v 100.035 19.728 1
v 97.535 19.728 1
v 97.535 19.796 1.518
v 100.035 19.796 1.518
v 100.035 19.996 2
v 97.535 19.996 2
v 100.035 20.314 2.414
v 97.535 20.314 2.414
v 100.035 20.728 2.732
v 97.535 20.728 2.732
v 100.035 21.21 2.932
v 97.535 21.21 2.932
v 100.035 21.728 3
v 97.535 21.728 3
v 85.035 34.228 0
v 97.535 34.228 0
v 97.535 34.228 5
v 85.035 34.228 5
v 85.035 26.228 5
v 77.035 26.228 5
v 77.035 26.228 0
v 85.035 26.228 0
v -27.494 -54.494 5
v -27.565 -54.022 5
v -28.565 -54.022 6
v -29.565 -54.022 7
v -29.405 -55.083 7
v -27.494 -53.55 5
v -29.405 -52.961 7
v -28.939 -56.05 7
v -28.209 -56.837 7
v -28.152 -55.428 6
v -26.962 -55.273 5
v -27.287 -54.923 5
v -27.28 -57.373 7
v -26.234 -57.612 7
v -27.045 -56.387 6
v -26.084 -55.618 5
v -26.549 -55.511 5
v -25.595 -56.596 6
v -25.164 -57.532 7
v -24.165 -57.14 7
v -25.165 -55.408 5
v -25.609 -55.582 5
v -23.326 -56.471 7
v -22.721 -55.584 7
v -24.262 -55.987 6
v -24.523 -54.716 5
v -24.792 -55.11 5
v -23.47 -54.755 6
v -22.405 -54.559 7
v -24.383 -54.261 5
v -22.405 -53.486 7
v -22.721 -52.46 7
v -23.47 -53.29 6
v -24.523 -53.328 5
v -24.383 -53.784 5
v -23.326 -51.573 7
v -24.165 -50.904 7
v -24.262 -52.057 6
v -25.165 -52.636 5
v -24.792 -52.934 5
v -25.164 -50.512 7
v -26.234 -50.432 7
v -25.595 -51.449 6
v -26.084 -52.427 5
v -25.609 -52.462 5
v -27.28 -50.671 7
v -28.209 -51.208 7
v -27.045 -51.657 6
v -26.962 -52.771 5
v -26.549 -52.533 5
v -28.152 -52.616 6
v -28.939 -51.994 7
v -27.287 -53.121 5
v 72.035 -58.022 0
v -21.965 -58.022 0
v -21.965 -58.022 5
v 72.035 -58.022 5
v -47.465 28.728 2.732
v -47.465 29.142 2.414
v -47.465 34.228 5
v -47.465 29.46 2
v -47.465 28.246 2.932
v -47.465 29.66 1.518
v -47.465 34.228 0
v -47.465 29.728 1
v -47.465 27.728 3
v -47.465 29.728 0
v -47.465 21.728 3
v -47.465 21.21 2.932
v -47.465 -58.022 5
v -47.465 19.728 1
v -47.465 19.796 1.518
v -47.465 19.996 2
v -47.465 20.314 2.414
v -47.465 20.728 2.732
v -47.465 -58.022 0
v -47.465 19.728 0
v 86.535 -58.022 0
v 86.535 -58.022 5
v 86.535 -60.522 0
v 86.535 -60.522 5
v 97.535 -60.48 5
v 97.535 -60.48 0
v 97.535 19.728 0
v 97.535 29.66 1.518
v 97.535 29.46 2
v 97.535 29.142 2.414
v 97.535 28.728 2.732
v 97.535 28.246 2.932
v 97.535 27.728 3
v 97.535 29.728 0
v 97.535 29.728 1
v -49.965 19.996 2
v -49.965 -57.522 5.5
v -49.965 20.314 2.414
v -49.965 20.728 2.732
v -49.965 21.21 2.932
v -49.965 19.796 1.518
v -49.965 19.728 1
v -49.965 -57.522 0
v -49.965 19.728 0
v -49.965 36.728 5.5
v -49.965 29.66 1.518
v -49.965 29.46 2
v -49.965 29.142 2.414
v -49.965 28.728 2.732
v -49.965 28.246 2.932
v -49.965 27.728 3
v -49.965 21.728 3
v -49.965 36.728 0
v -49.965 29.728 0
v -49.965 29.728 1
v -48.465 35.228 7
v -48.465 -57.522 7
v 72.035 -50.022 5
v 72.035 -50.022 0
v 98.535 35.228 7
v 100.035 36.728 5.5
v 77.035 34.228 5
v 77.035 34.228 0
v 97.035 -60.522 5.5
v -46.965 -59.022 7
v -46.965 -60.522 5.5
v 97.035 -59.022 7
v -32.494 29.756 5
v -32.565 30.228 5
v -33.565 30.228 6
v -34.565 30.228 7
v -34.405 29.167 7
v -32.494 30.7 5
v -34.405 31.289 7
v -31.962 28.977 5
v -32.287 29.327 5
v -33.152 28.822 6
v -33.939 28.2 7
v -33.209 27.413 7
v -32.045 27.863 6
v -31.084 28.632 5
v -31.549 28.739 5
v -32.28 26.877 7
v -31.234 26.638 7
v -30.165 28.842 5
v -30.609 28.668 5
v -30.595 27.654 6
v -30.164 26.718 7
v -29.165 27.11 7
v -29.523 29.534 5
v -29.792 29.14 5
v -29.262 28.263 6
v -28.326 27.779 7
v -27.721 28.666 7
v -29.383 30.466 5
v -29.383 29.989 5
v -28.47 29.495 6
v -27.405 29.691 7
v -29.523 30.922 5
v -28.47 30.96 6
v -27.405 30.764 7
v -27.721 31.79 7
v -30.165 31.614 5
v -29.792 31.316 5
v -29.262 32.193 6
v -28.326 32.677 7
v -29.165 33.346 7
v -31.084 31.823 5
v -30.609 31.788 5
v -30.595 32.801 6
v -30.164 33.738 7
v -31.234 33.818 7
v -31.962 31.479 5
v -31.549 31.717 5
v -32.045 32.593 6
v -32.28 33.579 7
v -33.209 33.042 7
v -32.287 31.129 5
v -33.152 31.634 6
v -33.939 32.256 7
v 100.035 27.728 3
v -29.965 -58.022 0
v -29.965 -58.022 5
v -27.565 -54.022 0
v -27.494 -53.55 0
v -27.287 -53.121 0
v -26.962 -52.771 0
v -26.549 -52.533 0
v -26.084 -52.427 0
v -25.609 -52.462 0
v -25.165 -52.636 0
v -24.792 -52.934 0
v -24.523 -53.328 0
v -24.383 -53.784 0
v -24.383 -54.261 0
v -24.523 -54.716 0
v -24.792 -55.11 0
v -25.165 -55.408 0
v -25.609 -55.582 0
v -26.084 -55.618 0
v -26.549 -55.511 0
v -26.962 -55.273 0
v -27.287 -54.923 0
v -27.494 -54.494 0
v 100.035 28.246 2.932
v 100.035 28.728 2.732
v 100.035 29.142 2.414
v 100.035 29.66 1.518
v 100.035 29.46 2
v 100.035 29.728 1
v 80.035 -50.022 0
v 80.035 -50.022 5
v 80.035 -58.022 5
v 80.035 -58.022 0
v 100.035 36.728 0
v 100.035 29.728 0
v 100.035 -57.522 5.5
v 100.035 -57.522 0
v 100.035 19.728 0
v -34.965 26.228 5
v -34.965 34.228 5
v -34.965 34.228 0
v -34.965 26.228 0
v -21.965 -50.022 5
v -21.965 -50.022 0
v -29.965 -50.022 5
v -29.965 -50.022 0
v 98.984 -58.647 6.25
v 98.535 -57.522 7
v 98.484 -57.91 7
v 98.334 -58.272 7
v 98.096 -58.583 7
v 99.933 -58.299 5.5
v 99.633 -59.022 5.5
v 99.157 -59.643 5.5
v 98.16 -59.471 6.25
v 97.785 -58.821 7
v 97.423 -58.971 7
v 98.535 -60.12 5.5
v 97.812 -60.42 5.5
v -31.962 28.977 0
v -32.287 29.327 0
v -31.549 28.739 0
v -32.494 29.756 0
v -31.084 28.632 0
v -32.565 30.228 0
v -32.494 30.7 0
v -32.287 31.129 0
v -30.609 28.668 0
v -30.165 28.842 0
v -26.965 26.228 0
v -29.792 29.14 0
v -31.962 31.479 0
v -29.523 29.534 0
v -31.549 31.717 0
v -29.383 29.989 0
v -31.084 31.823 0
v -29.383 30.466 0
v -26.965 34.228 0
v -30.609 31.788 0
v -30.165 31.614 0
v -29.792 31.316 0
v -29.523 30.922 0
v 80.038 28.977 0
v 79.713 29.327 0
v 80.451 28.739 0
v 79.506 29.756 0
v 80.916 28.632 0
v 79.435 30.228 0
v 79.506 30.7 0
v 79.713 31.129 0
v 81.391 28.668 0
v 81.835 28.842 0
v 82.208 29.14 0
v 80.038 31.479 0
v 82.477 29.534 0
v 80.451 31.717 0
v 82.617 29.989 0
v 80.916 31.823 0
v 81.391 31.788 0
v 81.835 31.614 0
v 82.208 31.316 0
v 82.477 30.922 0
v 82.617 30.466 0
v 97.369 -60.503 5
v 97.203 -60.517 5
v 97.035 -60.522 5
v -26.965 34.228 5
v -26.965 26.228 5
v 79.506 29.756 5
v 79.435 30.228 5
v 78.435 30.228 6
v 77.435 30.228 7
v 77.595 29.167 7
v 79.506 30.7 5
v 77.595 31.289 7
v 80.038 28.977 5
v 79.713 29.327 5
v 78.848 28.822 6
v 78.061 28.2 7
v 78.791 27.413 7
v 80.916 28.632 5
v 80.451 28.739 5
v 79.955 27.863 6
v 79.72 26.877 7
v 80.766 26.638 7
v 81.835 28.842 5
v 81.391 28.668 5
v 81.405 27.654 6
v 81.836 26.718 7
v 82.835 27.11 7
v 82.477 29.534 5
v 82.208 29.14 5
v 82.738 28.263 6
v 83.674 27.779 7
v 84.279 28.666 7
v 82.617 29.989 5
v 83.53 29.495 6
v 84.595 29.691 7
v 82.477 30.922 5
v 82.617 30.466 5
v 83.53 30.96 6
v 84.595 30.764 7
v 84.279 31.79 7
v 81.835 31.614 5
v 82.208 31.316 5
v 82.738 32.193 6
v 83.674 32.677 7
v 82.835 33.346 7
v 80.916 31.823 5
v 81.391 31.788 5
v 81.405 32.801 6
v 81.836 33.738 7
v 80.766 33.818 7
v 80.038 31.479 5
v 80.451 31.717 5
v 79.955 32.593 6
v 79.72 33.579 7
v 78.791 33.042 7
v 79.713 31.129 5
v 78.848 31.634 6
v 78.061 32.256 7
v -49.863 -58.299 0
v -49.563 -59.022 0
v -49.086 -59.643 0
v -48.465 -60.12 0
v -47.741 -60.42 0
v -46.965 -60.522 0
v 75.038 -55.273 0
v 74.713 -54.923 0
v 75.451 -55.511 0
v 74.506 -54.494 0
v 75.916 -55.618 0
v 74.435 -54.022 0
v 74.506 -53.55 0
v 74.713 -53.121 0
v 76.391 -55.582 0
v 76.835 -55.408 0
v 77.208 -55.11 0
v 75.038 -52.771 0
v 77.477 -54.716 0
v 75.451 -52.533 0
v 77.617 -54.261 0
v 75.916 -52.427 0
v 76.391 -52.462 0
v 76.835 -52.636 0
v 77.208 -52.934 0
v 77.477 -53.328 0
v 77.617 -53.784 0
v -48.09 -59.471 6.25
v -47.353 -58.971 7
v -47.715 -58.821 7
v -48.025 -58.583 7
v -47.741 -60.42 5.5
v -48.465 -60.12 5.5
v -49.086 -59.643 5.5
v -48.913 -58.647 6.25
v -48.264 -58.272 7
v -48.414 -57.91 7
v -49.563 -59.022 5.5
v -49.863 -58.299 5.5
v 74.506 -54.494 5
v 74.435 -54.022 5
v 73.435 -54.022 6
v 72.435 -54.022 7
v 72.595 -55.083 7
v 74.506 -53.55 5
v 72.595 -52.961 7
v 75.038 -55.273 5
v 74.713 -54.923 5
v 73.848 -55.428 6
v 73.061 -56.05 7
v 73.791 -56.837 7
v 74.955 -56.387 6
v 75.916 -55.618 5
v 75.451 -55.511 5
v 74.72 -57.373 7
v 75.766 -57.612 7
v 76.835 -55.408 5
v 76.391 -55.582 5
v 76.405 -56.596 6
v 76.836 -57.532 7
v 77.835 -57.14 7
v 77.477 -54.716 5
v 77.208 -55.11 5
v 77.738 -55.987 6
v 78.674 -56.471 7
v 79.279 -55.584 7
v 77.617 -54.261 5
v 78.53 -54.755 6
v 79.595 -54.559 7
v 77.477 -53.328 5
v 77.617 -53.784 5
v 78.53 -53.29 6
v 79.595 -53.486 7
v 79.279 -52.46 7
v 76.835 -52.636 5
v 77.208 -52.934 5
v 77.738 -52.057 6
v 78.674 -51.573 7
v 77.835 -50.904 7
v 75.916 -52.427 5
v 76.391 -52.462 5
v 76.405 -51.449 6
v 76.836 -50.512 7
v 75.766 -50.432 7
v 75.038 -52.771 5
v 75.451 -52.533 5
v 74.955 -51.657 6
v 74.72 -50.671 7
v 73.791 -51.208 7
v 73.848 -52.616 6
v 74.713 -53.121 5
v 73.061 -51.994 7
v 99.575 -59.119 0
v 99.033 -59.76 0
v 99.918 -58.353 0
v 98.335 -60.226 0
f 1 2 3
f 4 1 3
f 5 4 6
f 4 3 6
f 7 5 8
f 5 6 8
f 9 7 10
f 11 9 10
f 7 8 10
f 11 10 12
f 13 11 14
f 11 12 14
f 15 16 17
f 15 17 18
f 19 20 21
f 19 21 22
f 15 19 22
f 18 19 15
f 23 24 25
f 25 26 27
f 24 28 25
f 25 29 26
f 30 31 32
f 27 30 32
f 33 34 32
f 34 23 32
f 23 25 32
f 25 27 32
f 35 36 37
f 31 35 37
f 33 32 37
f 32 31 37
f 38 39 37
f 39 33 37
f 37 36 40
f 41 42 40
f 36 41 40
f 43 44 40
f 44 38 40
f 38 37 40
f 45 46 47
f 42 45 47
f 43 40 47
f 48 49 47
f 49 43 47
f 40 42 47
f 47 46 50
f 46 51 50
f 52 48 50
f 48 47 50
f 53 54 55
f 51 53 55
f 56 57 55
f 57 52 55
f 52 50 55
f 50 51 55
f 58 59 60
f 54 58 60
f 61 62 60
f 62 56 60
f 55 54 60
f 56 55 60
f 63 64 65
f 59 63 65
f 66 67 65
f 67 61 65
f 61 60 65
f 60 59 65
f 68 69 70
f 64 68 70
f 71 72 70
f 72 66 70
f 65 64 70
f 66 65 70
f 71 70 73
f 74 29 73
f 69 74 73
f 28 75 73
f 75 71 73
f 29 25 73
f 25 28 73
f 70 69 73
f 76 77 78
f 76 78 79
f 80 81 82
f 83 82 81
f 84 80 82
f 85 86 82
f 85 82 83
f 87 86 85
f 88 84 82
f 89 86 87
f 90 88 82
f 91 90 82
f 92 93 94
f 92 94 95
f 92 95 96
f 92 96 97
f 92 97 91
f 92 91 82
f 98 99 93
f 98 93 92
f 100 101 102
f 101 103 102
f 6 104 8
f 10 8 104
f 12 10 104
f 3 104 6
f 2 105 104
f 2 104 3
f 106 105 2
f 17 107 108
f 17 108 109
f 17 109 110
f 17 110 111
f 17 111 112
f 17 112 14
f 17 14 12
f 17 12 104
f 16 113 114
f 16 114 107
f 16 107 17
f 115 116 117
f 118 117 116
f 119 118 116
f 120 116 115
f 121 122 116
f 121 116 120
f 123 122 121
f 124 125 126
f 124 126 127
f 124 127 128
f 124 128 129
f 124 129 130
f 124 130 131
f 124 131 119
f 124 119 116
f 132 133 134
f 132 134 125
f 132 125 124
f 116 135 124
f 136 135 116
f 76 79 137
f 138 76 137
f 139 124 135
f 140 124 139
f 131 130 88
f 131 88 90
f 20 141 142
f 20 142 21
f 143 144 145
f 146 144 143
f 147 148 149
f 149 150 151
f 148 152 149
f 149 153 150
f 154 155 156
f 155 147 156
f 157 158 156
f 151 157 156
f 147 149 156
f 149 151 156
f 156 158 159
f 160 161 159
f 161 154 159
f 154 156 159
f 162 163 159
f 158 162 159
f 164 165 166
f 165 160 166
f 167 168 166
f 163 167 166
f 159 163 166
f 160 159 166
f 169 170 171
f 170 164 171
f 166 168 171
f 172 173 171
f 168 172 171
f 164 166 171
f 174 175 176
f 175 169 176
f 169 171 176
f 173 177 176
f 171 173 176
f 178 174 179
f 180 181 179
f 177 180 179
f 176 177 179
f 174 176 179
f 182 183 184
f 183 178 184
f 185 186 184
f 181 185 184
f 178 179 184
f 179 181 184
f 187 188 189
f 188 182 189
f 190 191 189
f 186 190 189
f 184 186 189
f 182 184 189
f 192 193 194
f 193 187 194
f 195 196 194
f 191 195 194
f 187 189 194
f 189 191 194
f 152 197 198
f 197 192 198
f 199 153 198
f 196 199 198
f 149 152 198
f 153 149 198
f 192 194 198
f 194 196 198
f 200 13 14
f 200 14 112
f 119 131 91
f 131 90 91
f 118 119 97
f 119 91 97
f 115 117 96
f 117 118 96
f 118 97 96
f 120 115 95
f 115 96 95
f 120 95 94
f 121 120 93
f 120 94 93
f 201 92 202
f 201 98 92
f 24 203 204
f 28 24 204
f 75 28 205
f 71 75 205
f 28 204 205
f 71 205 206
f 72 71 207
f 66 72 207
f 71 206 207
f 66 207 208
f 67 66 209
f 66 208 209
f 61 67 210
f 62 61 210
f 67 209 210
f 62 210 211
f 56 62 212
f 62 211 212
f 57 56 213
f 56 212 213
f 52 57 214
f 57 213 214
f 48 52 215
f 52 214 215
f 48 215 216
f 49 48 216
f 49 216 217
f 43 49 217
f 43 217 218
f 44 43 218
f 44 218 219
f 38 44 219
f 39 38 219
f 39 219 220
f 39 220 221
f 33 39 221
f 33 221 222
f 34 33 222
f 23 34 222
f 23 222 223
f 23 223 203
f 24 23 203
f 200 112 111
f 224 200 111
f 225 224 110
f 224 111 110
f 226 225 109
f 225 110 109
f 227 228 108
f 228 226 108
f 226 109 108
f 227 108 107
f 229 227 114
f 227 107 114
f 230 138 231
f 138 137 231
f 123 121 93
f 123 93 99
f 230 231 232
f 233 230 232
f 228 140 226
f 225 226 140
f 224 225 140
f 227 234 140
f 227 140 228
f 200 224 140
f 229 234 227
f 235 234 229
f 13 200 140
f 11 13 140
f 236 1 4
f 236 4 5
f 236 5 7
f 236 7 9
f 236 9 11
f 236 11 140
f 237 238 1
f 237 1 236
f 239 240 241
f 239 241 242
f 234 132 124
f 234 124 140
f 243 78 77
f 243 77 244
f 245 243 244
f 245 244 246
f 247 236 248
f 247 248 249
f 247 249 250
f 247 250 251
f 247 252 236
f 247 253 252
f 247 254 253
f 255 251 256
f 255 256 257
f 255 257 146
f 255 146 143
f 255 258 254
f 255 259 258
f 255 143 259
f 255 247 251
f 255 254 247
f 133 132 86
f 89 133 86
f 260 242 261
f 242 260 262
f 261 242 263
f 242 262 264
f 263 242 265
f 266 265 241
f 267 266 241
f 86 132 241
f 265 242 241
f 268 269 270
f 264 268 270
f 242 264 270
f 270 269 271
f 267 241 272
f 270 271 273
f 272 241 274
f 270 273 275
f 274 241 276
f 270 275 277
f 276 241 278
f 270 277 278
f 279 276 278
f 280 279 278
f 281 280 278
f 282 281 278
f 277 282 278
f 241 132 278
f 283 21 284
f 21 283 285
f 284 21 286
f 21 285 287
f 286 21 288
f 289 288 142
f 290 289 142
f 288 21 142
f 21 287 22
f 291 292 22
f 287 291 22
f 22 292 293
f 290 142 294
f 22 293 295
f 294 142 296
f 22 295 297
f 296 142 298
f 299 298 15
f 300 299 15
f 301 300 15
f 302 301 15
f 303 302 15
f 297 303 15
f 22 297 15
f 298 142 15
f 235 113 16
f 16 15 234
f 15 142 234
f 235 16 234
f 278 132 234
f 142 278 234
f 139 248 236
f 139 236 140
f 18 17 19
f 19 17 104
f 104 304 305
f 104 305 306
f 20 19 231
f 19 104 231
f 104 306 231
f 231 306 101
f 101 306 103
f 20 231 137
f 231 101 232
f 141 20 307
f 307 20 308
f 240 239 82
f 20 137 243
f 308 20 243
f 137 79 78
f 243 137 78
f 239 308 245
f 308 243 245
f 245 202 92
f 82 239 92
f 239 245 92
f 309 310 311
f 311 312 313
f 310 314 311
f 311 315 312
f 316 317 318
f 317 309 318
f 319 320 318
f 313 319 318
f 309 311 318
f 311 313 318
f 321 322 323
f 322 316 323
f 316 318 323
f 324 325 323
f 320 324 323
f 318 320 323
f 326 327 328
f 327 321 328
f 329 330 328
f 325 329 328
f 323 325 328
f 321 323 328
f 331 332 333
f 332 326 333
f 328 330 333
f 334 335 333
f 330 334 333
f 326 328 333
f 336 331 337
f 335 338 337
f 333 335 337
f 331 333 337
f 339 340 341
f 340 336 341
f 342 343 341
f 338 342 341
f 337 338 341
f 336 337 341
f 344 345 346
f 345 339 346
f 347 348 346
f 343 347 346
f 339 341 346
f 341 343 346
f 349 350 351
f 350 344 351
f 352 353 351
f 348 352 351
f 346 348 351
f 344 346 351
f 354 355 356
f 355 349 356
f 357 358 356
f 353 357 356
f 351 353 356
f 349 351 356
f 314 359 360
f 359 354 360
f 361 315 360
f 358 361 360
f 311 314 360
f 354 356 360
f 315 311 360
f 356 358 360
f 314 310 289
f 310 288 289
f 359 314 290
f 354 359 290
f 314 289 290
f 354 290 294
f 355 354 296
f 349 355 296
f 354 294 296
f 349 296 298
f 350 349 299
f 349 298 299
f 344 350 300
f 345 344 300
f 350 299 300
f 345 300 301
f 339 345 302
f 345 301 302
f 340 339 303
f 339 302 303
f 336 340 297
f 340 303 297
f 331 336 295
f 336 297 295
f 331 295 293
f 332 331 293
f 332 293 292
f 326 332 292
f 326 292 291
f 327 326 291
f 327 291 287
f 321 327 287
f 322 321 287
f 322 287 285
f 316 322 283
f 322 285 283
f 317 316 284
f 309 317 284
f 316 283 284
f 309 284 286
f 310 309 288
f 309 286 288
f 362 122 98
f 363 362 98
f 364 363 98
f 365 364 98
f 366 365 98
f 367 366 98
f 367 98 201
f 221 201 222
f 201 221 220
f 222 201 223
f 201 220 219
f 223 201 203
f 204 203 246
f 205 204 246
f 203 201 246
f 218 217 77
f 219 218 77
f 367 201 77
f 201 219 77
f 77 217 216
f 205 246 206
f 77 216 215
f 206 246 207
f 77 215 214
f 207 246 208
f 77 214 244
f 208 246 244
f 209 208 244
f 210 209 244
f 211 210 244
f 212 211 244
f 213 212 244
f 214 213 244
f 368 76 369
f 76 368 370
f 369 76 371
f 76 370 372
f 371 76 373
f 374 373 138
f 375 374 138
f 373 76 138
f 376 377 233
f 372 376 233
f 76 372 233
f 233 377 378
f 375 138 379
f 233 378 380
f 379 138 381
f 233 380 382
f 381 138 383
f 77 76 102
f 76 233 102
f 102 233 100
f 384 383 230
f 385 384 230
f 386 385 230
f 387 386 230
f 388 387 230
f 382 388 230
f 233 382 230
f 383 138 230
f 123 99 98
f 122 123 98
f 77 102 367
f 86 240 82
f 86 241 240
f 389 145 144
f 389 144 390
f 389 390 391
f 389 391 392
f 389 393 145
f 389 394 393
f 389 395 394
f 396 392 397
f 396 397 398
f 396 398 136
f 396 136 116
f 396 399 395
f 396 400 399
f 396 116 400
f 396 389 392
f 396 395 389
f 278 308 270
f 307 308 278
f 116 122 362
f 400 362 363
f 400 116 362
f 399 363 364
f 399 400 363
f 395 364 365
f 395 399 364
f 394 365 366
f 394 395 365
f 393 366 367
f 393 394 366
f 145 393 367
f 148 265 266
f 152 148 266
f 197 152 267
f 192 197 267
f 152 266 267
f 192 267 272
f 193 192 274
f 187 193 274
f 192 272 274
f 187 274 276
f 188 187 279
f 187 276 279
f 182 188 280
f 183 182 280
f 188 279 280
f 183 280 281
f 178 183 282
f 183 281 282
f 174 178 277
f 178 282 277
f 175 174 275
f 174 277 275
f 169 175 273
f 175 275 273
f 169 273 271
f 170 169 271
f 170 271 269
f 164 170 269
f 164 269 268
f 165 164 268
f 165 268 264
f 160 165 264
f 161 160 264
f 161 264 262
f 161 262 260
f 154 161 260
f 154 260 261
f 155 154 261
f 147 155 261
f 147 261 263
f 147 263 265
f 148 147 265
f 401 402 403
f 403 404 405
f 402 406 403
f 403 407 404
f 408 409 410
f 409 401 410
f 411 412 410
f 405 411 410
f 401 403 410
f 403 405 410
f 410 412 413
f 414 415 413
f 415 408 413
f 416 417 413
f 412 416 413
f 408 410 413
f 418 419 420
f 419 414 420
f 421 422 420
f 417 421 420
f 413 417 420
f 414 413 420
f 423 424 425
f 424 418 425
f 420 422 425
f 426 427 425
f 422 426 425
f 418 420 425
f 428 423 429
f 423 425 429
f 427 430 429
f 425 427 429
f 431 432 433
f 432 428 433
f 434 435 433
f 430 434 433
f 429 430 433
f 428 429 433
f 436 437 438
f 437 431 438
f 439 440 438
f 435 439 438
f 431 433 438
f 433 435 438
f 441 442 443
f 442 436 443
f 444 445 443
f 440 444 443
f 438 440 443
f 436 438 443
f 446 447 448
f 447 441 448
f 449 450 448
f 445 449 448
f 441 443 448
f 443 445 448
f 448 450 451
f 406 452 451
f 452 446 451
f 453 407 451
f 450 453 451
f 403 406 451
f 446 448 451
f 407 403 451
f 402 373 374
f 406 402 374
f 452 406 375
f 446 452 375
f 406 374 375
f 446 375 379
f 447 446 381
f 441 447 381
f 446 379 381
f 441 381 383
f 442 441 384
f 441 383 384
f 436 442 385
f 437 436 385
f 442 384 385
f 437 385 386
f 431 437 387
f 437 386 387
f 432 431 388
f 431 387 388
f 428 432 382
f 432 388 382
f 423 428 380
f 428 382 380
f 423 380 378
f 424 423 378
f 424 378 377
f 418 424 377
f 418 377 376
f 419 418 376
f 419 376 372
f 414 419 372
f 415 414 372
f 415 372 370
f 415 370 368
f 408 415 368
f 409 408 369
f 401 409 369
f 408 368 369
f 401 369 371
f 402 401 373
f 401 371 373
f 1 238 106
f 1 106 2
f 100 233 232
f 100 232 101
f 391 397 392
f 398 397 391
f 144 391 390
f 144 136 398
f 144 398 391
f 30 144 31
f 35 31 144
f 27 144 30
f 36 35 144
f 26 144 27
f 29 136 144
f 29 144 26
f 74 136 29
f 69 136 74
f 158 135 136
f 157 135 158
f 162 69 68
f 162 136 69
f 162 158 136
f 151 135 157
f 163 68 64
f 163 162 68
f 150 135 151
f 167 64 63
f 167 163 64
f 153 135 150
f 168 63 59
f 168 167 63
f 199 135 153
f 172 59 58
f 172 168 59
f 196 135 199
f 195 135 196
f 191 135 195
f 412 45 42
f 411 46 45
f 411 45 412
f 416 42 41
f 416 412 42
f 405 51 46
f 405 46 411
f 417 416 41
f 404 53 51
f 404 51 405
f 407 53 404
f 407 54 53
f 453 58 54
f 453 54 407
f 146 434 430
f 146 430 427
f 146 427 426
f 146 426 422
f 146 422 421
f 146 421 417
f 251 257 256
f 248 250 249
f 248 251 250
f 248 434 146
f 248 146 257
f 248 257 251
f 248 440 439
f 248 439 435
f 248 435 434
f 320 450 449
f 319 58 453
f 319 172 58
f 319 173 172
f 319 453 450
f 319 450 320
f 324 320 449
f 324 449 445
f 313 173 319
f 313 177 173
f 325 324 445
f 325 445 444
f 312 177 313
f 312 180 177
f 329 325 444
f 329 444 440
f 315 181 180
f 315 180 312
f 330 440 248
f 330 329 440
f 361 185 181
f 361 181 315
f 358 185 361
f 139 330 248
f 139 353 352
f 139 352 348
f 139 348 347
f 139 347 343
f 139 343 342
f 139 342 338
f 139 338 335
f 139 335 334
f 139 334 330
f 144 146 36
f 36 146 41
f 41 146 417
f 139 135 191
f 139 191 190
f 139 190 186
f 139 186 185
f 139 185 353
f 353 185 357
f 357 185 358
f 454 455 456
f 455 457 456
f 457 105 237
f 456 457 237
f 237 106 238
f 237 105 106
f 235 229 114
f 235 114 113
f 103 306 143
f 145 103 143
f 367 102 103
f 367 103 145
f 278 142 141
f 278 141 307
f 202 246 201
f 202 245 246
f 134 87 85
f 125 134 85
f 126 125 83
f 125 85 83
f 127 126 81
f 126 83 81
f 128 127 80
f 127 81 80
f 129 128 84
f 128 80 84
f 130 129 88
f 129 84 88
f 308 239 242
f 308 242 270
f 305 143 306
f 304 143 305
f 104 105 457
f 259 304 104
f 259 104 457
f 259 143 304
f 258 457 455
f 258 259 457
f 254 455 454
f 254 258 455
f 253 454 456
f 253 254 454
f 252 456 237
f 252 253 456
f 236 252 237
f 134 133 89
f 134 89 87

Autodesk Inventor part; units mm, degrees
ref_plane "YZ Plane" through (0, 0, 0) normal (1, 0, 0) x (0, 1, 0)
ref_plane "XZ Plane" through (0, 0, 0) normal (0, 1, 0) x (-1, 0, 0)
ref_plane "XY Plane" through (0, 0, 0) normal (0, 0, 1) x (1, 0, 0)
sketch "Sketch1" plane through (0, 0, 0) normal (0, 0, 1) x (1, 0, 0)
  line L0 (-49.9648, 36.7279) -> (100.0352, 36.7279)
  line L1 (100.0352, 36.7279) -> (100.0352, -60.5221)
  line L2 (100.0352, -60.5221) -> (-49.9648, -60.5221)
  line L3 (-49.9648, -60.5221) -> (-49.9648, 36.7279)
  point P0 (0, 0)
  dimension "d0" = 150
  dimension "d1" = 97.25
extrude "Extrusion1" add sketch "Sketch1" along normal blind 7
sketch "Sketch2" plane through (0, 0, 0) normal (0, 0, -1) x (-1, 0, 0)
  line L0 (47.4648, -58.0221) -> (-97.5352, -58.0221)
  line L1 (-97.5352, -58.0221) -> (-97.5352, 34.2279)
  line L2 (-97.5352, 34.2279) -> (47.4648, 34.2279)
  line L3 (47.4648, 34.2279) -> (47.4648, -58.0221)
  line L4 (49.9648, -60.5221) -> (-100.0352, -60.5221) projected
  line L5 (-100.0352, -60.5221) -> (-100.0352, 36.7279) projected
  line L6 (49.9648, 36.7279) -> (49.9648, -60.5221) projected
  line L7 (-100.0352, 36.7279) -> (49.9648, 36.7279) projected
  point P0 (0, 0)
  dimension "d4" = 2.5
  dimension "d5" = 2.5
  dimension "d6" = 2.5
  dimension "d7" = 2.5
extrude "Extrusion2" cut sketch "Sketch2" against normal blind 5 contours L0 L1 L2 L3
sketch "Sketch3" plane through (0, 0, 5) normal (0, 0, -1) x (-1, 0, 0)
  line L0 (47.4648, -58.0221) -> (-97.5352, -58.0221) projected
  line L1 (29.9648, -58.0221) -> (21.9648, -58.0221)
  line L2 (21.9648, -58.0221) -> (21.9648, -50.0221)
  line L3 (21.9648, -50.0221) -> (29.9648, -50.0221)
  line L4 (29.9648, -50.0221) -> (29.9648, -58.0221)
  line L5 (-80.0352, -58.0221) -> (-72.0352, -58.0221)
  line L6 (-72.0352, -58.0221) -> (-72.0352, -50.0221)
  line L7 (-72.0352, -50.0221) -> (-80.0352, -50.0221)
  line L8 (-80.0352, -50.0221) -> (-80.0352, -58.0221)
  line L9 (34.9648, 26.2279) -> (26.9648, 26.2279)
  line L10 (26.9648, 26.2279) -> (26.9648, 34.2279)
  line L11 (26.9648, 34.2279) -> (34.9648, 34.2279)
  line L12 (34.9648, 34.2279) -> (34.9648, 26.2279)
  line L13 (-77.0352, 26.2279) -> (-85.0352, 26.2279)
  line L14 (-85.0352, 26.2279) -> (-85.0352, 34.2279)
  line L15 (-85.0352, 34.2279) -> (-77.0352, 34.2279)
  line L16 (-77.0352, 34.2279) -> (-77.0352, 26.2279)
  line L17 (-100.0352, -60.5221) -> (-100.0352, 36.7279) projected
  line L18 (49.9648, 36.7279) -> (49.9648, -60.5221) projected
  line L19 (-100.0352, 36.7279) -> (49.9648, 36.7279) projected
  point P0 (0, 0)
  dimension "d10" = 8
  dimension "d11" = 8
  dimension "d12" = 8
  dimension "d13" = 20
  dimension "d14" = 20
  dimension "d15" = 8
  dimension "d16" = 8
  dimension "d17" = 8
  dimension "d18" = 8
  dimension "d19" = 15
  dimension "d20" = 15
  dimension "d21" = 10.5
extrude "Extrusion3" add sketch "Sketch3" along normal up to surface (5 mm away)
sketch "Sketch4" plane through (0, 0, 0) normal (0, 0, -1) x (-1, 0, 0)
  circle A0 centre (25.9648, -54.0221) radius 1.6
  circle A1 centre (-76.0352, -54.0221) radius 1.6
  line L0 (49.9648, 36.7279) -> (49.9648, -60.5221) projected
  line L1 (49.9648, -60.5221) -> (-100.0352, -60.5221) projected
  line L2 (-100.0352, -60.5221) -> (-100.0352, 36.7279) projected
  circle A2 centre (30.9648, 30.2279) radius 1.6
  circle A3 centre (-81.0352, 30.2279) radius 1.6
  line L3 (-100.0352, 36.7279) -> (49.9648, 36.7279) projected
  point P0 (0, 0)
  dimension "d24" = 3.2
  dimension "d25" = 3.2
  dimension "d26" = 24
  dimension "d27" = 6.5
  dimension "d28" = 24
  dimension "d29" = 6.5
  dimension "d30" = 3.2
  dimension "d31" = 3.2
  dimension "d32" = 19
  dimension "d33" = 6.5
  dimension "d34" = 6.5
  dimension "d35" = 19
extrude "Extrusion4" cut sketch "Sketch4" against normal through all contours A0 | A1 | A2 | A3
fillet "Fillet1" radius 3 2 edges at (100.0352, -60.5221, 3.5) (-49.9648, -60.5221, 3.5)
sketch "Sketch5" plane through (100.0352, 36.7279, 7) normal (1, 0, 0) x (0, 0, -1)
  line L0 (7, -17) -> (4, -17)
  line L1 (4, -17) -> (4, -7)
  line L2 (4, -7) -> (7, -7)
  line L3 (7, -7) -> (7, -17)
  line L4 (7, -94.25) -> (7, 0) projected
  line L5 (7, 0) -> (0, 0) projected
  point P0 (7, -36.7279)
  dimension "d39" = 3
  dimension "d40" = 7
  dimension "d41" = 10
extrude "Extrusion5" cut sketch "Sketch5" against normal up to surface (2.5 mm away)
fillet "Fillet2" radius 2 2 edges at (98.7852, 29.7279, 3) (98.7852, 19.7279, 3)
sketch "Sketch6" plane through (-49.9648, 36.7279, 0) normal (-1, 0, 0) x (0, 0, 1)
  line L0 (0, -2.5) -> (0, -94.75) projected
  line L1 (0, -7) -> (3, -7)
  line L2 (3, -7) -> (3, -17)
  line L3 (3, -17) -> (0, -17)
  line L4 (0, -17) -> (0, -7)
  line L5 (0, 0) -> (7, 0) projected
  point P0 (0, -36.7279)
  point P1 (0, -17)
  dimension "d45" = 3
  dimension "d46" = 10
  dimension "d47" = 7
extrude "Extrusion6" cut sketch "Sketch6" against normal up to surface (2.5 mm away)
fillet "Fillet3" radius 2 2 edges at (-48.7148, 29.7279, 3) (-48.7148, 19.7279, 3)
chamfer "Chamfer1" distance 1.5 angle 45 6 edges at (25.0352, 36.7279, 7) (-49.9648, -10.3971, 7) (-49.0861, -59.6434, 7) (25.0352, -60.5221, 7) (99.1566, -59.6434, 7) (100.0352, -10.3971, 7)
sketch "Sketch7" plane through (-46.9648, -60.5221, 0) normal (0, -1, 0) x (1, 0, 0)
  line L0 (147, 0) -> (-3, 0) projected
  line L1 (133.5, 0) -> (144.5, 0)
  line L2 (144.5, 0) -> (144.5, 5)
  line L3 (144.5, 5) -> (133.5, 5)
  line L4 (133.5, 5) -> (133.5, 0)
  line L5 (147, 0) -> (147, 5.5) projected
  point P0 (46.9648, 0)
  dimension "d54" = 5
  dimension "d55" = 11
  dimension "d56" = 2.5
extrude "Extrusion7" cut sketch "Sketch7" against normal up to surface (2.5 mm away)
chamfer "Chamfer2" distance 2 angle 45 4 edges at (-29.3648, 30.2279, 7) (-24.3648, -54.0221, 7) (77.6352, -54.0221, 7) (82.6352, 30.2279, 7)
properties part number "e_box_lid"
